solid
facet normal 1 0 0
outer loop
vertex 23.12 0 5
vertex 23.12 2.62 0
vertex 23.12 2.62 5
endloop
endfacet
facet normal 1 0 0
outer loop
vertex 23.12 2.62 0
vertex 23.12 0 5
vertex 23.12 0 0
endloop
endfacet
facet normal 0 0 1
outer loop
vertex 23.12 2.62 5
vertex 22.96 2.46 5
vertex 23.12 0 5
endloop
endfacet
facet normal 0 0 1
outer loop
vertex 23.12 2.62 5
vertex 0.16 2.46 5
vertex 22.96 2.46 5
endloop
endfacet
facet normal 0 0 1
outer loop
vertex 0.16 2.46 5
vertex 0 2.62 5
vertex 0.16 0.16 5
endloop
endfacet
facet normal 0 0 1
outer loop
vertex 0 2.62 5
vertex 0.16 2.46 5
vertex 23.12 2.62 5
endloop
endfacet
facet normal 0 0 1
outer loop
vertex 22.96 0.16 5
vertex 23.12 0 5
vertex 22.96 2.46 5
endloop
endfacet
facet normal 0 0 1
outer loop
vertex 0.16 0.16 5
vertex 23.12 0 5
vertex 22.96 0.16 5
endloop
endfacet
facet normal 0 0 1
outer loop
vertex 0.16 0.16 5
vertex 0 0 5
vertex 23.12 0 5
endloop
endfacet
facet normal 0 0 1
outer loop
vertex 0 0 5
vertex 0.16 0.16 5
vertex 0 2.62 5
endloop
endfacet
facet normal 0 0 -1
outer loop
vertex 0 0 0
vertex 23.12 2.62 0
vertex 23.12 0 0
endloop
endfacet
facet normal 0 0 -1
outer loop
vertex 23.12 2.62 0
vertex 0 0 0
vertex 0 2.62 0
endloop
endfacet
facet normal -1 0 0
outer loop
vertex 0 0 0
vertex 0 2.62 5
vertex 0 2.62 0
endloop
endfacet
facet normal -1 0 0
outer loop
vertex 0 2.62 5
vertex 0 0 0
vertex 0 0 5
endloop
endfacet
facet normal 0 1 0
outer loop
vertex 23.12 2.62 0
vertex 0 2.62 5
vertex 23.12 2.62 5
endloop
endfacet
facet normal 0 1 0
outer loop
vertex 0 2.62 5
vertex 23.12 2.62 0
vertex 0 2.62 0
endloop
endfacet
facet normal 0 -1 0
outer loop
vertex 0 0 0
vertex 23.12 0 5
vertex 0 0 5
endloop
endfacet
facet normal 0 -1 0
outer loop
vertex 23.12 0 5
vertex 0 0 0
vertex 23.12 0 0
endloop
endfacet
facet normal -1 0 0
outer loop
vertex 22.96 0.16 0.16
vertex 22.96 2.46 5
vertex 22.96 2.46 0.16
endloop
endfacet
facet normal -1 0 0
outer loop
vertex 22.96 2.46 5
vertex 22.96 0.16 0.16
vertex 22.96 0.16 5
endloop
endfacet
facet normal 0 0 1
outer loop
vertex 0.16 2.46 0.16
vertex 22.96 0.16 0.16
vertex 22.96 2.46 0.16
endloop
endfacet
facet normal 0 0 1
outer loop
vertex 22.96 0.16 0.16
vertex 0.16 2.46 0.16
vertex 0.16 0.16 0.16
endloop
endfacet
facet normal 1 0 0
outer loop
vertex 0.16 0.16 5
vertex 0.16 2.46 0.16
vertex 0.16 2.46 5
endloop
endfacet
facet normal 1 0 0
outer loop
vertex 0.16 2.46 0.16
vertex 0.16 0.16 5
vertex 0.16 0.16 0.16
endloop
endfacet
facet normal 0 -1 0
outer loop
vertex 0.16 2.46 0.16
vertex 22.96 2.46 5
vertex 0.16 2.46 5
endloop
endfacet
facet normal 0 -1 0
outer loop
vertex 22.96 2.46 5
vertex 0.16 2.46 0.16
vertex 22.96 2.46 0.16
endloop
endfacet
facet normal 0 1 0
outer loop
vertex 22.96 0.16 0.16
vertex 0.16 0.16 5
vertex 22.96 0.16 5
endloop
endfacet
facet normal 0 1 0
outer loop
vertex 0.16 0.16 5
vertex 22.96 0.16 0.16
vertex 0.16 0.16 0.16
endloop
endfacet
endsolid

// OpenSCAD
// Ultimaker 2 build volume
// 23 x 22.5 x 20.5cm

// Change these numbers to get different size boxes.
// These are the inside dimensions of the knife container.
kc_l = 22.8; // Knife Container length
kc_w = 2.3; // Knife Container width
kc_h = 5; // Knife Container height
// How thick the sides will be.
wall_thickness = .16;

// Taking the difference of two cubes,
// One larger, 
// the other smaller by two wall thicknesses and 
// offset by one wall thickness in x, y, and z directions
difference(){
    cube([kc_l+wall_thickness*2, kc_w+wall_thickness*2, kc_h]);
    translate([wall_thickness,wall_thickness,wall_thickness]){cube([kc_l, kc_w, kc_h]);}
}
